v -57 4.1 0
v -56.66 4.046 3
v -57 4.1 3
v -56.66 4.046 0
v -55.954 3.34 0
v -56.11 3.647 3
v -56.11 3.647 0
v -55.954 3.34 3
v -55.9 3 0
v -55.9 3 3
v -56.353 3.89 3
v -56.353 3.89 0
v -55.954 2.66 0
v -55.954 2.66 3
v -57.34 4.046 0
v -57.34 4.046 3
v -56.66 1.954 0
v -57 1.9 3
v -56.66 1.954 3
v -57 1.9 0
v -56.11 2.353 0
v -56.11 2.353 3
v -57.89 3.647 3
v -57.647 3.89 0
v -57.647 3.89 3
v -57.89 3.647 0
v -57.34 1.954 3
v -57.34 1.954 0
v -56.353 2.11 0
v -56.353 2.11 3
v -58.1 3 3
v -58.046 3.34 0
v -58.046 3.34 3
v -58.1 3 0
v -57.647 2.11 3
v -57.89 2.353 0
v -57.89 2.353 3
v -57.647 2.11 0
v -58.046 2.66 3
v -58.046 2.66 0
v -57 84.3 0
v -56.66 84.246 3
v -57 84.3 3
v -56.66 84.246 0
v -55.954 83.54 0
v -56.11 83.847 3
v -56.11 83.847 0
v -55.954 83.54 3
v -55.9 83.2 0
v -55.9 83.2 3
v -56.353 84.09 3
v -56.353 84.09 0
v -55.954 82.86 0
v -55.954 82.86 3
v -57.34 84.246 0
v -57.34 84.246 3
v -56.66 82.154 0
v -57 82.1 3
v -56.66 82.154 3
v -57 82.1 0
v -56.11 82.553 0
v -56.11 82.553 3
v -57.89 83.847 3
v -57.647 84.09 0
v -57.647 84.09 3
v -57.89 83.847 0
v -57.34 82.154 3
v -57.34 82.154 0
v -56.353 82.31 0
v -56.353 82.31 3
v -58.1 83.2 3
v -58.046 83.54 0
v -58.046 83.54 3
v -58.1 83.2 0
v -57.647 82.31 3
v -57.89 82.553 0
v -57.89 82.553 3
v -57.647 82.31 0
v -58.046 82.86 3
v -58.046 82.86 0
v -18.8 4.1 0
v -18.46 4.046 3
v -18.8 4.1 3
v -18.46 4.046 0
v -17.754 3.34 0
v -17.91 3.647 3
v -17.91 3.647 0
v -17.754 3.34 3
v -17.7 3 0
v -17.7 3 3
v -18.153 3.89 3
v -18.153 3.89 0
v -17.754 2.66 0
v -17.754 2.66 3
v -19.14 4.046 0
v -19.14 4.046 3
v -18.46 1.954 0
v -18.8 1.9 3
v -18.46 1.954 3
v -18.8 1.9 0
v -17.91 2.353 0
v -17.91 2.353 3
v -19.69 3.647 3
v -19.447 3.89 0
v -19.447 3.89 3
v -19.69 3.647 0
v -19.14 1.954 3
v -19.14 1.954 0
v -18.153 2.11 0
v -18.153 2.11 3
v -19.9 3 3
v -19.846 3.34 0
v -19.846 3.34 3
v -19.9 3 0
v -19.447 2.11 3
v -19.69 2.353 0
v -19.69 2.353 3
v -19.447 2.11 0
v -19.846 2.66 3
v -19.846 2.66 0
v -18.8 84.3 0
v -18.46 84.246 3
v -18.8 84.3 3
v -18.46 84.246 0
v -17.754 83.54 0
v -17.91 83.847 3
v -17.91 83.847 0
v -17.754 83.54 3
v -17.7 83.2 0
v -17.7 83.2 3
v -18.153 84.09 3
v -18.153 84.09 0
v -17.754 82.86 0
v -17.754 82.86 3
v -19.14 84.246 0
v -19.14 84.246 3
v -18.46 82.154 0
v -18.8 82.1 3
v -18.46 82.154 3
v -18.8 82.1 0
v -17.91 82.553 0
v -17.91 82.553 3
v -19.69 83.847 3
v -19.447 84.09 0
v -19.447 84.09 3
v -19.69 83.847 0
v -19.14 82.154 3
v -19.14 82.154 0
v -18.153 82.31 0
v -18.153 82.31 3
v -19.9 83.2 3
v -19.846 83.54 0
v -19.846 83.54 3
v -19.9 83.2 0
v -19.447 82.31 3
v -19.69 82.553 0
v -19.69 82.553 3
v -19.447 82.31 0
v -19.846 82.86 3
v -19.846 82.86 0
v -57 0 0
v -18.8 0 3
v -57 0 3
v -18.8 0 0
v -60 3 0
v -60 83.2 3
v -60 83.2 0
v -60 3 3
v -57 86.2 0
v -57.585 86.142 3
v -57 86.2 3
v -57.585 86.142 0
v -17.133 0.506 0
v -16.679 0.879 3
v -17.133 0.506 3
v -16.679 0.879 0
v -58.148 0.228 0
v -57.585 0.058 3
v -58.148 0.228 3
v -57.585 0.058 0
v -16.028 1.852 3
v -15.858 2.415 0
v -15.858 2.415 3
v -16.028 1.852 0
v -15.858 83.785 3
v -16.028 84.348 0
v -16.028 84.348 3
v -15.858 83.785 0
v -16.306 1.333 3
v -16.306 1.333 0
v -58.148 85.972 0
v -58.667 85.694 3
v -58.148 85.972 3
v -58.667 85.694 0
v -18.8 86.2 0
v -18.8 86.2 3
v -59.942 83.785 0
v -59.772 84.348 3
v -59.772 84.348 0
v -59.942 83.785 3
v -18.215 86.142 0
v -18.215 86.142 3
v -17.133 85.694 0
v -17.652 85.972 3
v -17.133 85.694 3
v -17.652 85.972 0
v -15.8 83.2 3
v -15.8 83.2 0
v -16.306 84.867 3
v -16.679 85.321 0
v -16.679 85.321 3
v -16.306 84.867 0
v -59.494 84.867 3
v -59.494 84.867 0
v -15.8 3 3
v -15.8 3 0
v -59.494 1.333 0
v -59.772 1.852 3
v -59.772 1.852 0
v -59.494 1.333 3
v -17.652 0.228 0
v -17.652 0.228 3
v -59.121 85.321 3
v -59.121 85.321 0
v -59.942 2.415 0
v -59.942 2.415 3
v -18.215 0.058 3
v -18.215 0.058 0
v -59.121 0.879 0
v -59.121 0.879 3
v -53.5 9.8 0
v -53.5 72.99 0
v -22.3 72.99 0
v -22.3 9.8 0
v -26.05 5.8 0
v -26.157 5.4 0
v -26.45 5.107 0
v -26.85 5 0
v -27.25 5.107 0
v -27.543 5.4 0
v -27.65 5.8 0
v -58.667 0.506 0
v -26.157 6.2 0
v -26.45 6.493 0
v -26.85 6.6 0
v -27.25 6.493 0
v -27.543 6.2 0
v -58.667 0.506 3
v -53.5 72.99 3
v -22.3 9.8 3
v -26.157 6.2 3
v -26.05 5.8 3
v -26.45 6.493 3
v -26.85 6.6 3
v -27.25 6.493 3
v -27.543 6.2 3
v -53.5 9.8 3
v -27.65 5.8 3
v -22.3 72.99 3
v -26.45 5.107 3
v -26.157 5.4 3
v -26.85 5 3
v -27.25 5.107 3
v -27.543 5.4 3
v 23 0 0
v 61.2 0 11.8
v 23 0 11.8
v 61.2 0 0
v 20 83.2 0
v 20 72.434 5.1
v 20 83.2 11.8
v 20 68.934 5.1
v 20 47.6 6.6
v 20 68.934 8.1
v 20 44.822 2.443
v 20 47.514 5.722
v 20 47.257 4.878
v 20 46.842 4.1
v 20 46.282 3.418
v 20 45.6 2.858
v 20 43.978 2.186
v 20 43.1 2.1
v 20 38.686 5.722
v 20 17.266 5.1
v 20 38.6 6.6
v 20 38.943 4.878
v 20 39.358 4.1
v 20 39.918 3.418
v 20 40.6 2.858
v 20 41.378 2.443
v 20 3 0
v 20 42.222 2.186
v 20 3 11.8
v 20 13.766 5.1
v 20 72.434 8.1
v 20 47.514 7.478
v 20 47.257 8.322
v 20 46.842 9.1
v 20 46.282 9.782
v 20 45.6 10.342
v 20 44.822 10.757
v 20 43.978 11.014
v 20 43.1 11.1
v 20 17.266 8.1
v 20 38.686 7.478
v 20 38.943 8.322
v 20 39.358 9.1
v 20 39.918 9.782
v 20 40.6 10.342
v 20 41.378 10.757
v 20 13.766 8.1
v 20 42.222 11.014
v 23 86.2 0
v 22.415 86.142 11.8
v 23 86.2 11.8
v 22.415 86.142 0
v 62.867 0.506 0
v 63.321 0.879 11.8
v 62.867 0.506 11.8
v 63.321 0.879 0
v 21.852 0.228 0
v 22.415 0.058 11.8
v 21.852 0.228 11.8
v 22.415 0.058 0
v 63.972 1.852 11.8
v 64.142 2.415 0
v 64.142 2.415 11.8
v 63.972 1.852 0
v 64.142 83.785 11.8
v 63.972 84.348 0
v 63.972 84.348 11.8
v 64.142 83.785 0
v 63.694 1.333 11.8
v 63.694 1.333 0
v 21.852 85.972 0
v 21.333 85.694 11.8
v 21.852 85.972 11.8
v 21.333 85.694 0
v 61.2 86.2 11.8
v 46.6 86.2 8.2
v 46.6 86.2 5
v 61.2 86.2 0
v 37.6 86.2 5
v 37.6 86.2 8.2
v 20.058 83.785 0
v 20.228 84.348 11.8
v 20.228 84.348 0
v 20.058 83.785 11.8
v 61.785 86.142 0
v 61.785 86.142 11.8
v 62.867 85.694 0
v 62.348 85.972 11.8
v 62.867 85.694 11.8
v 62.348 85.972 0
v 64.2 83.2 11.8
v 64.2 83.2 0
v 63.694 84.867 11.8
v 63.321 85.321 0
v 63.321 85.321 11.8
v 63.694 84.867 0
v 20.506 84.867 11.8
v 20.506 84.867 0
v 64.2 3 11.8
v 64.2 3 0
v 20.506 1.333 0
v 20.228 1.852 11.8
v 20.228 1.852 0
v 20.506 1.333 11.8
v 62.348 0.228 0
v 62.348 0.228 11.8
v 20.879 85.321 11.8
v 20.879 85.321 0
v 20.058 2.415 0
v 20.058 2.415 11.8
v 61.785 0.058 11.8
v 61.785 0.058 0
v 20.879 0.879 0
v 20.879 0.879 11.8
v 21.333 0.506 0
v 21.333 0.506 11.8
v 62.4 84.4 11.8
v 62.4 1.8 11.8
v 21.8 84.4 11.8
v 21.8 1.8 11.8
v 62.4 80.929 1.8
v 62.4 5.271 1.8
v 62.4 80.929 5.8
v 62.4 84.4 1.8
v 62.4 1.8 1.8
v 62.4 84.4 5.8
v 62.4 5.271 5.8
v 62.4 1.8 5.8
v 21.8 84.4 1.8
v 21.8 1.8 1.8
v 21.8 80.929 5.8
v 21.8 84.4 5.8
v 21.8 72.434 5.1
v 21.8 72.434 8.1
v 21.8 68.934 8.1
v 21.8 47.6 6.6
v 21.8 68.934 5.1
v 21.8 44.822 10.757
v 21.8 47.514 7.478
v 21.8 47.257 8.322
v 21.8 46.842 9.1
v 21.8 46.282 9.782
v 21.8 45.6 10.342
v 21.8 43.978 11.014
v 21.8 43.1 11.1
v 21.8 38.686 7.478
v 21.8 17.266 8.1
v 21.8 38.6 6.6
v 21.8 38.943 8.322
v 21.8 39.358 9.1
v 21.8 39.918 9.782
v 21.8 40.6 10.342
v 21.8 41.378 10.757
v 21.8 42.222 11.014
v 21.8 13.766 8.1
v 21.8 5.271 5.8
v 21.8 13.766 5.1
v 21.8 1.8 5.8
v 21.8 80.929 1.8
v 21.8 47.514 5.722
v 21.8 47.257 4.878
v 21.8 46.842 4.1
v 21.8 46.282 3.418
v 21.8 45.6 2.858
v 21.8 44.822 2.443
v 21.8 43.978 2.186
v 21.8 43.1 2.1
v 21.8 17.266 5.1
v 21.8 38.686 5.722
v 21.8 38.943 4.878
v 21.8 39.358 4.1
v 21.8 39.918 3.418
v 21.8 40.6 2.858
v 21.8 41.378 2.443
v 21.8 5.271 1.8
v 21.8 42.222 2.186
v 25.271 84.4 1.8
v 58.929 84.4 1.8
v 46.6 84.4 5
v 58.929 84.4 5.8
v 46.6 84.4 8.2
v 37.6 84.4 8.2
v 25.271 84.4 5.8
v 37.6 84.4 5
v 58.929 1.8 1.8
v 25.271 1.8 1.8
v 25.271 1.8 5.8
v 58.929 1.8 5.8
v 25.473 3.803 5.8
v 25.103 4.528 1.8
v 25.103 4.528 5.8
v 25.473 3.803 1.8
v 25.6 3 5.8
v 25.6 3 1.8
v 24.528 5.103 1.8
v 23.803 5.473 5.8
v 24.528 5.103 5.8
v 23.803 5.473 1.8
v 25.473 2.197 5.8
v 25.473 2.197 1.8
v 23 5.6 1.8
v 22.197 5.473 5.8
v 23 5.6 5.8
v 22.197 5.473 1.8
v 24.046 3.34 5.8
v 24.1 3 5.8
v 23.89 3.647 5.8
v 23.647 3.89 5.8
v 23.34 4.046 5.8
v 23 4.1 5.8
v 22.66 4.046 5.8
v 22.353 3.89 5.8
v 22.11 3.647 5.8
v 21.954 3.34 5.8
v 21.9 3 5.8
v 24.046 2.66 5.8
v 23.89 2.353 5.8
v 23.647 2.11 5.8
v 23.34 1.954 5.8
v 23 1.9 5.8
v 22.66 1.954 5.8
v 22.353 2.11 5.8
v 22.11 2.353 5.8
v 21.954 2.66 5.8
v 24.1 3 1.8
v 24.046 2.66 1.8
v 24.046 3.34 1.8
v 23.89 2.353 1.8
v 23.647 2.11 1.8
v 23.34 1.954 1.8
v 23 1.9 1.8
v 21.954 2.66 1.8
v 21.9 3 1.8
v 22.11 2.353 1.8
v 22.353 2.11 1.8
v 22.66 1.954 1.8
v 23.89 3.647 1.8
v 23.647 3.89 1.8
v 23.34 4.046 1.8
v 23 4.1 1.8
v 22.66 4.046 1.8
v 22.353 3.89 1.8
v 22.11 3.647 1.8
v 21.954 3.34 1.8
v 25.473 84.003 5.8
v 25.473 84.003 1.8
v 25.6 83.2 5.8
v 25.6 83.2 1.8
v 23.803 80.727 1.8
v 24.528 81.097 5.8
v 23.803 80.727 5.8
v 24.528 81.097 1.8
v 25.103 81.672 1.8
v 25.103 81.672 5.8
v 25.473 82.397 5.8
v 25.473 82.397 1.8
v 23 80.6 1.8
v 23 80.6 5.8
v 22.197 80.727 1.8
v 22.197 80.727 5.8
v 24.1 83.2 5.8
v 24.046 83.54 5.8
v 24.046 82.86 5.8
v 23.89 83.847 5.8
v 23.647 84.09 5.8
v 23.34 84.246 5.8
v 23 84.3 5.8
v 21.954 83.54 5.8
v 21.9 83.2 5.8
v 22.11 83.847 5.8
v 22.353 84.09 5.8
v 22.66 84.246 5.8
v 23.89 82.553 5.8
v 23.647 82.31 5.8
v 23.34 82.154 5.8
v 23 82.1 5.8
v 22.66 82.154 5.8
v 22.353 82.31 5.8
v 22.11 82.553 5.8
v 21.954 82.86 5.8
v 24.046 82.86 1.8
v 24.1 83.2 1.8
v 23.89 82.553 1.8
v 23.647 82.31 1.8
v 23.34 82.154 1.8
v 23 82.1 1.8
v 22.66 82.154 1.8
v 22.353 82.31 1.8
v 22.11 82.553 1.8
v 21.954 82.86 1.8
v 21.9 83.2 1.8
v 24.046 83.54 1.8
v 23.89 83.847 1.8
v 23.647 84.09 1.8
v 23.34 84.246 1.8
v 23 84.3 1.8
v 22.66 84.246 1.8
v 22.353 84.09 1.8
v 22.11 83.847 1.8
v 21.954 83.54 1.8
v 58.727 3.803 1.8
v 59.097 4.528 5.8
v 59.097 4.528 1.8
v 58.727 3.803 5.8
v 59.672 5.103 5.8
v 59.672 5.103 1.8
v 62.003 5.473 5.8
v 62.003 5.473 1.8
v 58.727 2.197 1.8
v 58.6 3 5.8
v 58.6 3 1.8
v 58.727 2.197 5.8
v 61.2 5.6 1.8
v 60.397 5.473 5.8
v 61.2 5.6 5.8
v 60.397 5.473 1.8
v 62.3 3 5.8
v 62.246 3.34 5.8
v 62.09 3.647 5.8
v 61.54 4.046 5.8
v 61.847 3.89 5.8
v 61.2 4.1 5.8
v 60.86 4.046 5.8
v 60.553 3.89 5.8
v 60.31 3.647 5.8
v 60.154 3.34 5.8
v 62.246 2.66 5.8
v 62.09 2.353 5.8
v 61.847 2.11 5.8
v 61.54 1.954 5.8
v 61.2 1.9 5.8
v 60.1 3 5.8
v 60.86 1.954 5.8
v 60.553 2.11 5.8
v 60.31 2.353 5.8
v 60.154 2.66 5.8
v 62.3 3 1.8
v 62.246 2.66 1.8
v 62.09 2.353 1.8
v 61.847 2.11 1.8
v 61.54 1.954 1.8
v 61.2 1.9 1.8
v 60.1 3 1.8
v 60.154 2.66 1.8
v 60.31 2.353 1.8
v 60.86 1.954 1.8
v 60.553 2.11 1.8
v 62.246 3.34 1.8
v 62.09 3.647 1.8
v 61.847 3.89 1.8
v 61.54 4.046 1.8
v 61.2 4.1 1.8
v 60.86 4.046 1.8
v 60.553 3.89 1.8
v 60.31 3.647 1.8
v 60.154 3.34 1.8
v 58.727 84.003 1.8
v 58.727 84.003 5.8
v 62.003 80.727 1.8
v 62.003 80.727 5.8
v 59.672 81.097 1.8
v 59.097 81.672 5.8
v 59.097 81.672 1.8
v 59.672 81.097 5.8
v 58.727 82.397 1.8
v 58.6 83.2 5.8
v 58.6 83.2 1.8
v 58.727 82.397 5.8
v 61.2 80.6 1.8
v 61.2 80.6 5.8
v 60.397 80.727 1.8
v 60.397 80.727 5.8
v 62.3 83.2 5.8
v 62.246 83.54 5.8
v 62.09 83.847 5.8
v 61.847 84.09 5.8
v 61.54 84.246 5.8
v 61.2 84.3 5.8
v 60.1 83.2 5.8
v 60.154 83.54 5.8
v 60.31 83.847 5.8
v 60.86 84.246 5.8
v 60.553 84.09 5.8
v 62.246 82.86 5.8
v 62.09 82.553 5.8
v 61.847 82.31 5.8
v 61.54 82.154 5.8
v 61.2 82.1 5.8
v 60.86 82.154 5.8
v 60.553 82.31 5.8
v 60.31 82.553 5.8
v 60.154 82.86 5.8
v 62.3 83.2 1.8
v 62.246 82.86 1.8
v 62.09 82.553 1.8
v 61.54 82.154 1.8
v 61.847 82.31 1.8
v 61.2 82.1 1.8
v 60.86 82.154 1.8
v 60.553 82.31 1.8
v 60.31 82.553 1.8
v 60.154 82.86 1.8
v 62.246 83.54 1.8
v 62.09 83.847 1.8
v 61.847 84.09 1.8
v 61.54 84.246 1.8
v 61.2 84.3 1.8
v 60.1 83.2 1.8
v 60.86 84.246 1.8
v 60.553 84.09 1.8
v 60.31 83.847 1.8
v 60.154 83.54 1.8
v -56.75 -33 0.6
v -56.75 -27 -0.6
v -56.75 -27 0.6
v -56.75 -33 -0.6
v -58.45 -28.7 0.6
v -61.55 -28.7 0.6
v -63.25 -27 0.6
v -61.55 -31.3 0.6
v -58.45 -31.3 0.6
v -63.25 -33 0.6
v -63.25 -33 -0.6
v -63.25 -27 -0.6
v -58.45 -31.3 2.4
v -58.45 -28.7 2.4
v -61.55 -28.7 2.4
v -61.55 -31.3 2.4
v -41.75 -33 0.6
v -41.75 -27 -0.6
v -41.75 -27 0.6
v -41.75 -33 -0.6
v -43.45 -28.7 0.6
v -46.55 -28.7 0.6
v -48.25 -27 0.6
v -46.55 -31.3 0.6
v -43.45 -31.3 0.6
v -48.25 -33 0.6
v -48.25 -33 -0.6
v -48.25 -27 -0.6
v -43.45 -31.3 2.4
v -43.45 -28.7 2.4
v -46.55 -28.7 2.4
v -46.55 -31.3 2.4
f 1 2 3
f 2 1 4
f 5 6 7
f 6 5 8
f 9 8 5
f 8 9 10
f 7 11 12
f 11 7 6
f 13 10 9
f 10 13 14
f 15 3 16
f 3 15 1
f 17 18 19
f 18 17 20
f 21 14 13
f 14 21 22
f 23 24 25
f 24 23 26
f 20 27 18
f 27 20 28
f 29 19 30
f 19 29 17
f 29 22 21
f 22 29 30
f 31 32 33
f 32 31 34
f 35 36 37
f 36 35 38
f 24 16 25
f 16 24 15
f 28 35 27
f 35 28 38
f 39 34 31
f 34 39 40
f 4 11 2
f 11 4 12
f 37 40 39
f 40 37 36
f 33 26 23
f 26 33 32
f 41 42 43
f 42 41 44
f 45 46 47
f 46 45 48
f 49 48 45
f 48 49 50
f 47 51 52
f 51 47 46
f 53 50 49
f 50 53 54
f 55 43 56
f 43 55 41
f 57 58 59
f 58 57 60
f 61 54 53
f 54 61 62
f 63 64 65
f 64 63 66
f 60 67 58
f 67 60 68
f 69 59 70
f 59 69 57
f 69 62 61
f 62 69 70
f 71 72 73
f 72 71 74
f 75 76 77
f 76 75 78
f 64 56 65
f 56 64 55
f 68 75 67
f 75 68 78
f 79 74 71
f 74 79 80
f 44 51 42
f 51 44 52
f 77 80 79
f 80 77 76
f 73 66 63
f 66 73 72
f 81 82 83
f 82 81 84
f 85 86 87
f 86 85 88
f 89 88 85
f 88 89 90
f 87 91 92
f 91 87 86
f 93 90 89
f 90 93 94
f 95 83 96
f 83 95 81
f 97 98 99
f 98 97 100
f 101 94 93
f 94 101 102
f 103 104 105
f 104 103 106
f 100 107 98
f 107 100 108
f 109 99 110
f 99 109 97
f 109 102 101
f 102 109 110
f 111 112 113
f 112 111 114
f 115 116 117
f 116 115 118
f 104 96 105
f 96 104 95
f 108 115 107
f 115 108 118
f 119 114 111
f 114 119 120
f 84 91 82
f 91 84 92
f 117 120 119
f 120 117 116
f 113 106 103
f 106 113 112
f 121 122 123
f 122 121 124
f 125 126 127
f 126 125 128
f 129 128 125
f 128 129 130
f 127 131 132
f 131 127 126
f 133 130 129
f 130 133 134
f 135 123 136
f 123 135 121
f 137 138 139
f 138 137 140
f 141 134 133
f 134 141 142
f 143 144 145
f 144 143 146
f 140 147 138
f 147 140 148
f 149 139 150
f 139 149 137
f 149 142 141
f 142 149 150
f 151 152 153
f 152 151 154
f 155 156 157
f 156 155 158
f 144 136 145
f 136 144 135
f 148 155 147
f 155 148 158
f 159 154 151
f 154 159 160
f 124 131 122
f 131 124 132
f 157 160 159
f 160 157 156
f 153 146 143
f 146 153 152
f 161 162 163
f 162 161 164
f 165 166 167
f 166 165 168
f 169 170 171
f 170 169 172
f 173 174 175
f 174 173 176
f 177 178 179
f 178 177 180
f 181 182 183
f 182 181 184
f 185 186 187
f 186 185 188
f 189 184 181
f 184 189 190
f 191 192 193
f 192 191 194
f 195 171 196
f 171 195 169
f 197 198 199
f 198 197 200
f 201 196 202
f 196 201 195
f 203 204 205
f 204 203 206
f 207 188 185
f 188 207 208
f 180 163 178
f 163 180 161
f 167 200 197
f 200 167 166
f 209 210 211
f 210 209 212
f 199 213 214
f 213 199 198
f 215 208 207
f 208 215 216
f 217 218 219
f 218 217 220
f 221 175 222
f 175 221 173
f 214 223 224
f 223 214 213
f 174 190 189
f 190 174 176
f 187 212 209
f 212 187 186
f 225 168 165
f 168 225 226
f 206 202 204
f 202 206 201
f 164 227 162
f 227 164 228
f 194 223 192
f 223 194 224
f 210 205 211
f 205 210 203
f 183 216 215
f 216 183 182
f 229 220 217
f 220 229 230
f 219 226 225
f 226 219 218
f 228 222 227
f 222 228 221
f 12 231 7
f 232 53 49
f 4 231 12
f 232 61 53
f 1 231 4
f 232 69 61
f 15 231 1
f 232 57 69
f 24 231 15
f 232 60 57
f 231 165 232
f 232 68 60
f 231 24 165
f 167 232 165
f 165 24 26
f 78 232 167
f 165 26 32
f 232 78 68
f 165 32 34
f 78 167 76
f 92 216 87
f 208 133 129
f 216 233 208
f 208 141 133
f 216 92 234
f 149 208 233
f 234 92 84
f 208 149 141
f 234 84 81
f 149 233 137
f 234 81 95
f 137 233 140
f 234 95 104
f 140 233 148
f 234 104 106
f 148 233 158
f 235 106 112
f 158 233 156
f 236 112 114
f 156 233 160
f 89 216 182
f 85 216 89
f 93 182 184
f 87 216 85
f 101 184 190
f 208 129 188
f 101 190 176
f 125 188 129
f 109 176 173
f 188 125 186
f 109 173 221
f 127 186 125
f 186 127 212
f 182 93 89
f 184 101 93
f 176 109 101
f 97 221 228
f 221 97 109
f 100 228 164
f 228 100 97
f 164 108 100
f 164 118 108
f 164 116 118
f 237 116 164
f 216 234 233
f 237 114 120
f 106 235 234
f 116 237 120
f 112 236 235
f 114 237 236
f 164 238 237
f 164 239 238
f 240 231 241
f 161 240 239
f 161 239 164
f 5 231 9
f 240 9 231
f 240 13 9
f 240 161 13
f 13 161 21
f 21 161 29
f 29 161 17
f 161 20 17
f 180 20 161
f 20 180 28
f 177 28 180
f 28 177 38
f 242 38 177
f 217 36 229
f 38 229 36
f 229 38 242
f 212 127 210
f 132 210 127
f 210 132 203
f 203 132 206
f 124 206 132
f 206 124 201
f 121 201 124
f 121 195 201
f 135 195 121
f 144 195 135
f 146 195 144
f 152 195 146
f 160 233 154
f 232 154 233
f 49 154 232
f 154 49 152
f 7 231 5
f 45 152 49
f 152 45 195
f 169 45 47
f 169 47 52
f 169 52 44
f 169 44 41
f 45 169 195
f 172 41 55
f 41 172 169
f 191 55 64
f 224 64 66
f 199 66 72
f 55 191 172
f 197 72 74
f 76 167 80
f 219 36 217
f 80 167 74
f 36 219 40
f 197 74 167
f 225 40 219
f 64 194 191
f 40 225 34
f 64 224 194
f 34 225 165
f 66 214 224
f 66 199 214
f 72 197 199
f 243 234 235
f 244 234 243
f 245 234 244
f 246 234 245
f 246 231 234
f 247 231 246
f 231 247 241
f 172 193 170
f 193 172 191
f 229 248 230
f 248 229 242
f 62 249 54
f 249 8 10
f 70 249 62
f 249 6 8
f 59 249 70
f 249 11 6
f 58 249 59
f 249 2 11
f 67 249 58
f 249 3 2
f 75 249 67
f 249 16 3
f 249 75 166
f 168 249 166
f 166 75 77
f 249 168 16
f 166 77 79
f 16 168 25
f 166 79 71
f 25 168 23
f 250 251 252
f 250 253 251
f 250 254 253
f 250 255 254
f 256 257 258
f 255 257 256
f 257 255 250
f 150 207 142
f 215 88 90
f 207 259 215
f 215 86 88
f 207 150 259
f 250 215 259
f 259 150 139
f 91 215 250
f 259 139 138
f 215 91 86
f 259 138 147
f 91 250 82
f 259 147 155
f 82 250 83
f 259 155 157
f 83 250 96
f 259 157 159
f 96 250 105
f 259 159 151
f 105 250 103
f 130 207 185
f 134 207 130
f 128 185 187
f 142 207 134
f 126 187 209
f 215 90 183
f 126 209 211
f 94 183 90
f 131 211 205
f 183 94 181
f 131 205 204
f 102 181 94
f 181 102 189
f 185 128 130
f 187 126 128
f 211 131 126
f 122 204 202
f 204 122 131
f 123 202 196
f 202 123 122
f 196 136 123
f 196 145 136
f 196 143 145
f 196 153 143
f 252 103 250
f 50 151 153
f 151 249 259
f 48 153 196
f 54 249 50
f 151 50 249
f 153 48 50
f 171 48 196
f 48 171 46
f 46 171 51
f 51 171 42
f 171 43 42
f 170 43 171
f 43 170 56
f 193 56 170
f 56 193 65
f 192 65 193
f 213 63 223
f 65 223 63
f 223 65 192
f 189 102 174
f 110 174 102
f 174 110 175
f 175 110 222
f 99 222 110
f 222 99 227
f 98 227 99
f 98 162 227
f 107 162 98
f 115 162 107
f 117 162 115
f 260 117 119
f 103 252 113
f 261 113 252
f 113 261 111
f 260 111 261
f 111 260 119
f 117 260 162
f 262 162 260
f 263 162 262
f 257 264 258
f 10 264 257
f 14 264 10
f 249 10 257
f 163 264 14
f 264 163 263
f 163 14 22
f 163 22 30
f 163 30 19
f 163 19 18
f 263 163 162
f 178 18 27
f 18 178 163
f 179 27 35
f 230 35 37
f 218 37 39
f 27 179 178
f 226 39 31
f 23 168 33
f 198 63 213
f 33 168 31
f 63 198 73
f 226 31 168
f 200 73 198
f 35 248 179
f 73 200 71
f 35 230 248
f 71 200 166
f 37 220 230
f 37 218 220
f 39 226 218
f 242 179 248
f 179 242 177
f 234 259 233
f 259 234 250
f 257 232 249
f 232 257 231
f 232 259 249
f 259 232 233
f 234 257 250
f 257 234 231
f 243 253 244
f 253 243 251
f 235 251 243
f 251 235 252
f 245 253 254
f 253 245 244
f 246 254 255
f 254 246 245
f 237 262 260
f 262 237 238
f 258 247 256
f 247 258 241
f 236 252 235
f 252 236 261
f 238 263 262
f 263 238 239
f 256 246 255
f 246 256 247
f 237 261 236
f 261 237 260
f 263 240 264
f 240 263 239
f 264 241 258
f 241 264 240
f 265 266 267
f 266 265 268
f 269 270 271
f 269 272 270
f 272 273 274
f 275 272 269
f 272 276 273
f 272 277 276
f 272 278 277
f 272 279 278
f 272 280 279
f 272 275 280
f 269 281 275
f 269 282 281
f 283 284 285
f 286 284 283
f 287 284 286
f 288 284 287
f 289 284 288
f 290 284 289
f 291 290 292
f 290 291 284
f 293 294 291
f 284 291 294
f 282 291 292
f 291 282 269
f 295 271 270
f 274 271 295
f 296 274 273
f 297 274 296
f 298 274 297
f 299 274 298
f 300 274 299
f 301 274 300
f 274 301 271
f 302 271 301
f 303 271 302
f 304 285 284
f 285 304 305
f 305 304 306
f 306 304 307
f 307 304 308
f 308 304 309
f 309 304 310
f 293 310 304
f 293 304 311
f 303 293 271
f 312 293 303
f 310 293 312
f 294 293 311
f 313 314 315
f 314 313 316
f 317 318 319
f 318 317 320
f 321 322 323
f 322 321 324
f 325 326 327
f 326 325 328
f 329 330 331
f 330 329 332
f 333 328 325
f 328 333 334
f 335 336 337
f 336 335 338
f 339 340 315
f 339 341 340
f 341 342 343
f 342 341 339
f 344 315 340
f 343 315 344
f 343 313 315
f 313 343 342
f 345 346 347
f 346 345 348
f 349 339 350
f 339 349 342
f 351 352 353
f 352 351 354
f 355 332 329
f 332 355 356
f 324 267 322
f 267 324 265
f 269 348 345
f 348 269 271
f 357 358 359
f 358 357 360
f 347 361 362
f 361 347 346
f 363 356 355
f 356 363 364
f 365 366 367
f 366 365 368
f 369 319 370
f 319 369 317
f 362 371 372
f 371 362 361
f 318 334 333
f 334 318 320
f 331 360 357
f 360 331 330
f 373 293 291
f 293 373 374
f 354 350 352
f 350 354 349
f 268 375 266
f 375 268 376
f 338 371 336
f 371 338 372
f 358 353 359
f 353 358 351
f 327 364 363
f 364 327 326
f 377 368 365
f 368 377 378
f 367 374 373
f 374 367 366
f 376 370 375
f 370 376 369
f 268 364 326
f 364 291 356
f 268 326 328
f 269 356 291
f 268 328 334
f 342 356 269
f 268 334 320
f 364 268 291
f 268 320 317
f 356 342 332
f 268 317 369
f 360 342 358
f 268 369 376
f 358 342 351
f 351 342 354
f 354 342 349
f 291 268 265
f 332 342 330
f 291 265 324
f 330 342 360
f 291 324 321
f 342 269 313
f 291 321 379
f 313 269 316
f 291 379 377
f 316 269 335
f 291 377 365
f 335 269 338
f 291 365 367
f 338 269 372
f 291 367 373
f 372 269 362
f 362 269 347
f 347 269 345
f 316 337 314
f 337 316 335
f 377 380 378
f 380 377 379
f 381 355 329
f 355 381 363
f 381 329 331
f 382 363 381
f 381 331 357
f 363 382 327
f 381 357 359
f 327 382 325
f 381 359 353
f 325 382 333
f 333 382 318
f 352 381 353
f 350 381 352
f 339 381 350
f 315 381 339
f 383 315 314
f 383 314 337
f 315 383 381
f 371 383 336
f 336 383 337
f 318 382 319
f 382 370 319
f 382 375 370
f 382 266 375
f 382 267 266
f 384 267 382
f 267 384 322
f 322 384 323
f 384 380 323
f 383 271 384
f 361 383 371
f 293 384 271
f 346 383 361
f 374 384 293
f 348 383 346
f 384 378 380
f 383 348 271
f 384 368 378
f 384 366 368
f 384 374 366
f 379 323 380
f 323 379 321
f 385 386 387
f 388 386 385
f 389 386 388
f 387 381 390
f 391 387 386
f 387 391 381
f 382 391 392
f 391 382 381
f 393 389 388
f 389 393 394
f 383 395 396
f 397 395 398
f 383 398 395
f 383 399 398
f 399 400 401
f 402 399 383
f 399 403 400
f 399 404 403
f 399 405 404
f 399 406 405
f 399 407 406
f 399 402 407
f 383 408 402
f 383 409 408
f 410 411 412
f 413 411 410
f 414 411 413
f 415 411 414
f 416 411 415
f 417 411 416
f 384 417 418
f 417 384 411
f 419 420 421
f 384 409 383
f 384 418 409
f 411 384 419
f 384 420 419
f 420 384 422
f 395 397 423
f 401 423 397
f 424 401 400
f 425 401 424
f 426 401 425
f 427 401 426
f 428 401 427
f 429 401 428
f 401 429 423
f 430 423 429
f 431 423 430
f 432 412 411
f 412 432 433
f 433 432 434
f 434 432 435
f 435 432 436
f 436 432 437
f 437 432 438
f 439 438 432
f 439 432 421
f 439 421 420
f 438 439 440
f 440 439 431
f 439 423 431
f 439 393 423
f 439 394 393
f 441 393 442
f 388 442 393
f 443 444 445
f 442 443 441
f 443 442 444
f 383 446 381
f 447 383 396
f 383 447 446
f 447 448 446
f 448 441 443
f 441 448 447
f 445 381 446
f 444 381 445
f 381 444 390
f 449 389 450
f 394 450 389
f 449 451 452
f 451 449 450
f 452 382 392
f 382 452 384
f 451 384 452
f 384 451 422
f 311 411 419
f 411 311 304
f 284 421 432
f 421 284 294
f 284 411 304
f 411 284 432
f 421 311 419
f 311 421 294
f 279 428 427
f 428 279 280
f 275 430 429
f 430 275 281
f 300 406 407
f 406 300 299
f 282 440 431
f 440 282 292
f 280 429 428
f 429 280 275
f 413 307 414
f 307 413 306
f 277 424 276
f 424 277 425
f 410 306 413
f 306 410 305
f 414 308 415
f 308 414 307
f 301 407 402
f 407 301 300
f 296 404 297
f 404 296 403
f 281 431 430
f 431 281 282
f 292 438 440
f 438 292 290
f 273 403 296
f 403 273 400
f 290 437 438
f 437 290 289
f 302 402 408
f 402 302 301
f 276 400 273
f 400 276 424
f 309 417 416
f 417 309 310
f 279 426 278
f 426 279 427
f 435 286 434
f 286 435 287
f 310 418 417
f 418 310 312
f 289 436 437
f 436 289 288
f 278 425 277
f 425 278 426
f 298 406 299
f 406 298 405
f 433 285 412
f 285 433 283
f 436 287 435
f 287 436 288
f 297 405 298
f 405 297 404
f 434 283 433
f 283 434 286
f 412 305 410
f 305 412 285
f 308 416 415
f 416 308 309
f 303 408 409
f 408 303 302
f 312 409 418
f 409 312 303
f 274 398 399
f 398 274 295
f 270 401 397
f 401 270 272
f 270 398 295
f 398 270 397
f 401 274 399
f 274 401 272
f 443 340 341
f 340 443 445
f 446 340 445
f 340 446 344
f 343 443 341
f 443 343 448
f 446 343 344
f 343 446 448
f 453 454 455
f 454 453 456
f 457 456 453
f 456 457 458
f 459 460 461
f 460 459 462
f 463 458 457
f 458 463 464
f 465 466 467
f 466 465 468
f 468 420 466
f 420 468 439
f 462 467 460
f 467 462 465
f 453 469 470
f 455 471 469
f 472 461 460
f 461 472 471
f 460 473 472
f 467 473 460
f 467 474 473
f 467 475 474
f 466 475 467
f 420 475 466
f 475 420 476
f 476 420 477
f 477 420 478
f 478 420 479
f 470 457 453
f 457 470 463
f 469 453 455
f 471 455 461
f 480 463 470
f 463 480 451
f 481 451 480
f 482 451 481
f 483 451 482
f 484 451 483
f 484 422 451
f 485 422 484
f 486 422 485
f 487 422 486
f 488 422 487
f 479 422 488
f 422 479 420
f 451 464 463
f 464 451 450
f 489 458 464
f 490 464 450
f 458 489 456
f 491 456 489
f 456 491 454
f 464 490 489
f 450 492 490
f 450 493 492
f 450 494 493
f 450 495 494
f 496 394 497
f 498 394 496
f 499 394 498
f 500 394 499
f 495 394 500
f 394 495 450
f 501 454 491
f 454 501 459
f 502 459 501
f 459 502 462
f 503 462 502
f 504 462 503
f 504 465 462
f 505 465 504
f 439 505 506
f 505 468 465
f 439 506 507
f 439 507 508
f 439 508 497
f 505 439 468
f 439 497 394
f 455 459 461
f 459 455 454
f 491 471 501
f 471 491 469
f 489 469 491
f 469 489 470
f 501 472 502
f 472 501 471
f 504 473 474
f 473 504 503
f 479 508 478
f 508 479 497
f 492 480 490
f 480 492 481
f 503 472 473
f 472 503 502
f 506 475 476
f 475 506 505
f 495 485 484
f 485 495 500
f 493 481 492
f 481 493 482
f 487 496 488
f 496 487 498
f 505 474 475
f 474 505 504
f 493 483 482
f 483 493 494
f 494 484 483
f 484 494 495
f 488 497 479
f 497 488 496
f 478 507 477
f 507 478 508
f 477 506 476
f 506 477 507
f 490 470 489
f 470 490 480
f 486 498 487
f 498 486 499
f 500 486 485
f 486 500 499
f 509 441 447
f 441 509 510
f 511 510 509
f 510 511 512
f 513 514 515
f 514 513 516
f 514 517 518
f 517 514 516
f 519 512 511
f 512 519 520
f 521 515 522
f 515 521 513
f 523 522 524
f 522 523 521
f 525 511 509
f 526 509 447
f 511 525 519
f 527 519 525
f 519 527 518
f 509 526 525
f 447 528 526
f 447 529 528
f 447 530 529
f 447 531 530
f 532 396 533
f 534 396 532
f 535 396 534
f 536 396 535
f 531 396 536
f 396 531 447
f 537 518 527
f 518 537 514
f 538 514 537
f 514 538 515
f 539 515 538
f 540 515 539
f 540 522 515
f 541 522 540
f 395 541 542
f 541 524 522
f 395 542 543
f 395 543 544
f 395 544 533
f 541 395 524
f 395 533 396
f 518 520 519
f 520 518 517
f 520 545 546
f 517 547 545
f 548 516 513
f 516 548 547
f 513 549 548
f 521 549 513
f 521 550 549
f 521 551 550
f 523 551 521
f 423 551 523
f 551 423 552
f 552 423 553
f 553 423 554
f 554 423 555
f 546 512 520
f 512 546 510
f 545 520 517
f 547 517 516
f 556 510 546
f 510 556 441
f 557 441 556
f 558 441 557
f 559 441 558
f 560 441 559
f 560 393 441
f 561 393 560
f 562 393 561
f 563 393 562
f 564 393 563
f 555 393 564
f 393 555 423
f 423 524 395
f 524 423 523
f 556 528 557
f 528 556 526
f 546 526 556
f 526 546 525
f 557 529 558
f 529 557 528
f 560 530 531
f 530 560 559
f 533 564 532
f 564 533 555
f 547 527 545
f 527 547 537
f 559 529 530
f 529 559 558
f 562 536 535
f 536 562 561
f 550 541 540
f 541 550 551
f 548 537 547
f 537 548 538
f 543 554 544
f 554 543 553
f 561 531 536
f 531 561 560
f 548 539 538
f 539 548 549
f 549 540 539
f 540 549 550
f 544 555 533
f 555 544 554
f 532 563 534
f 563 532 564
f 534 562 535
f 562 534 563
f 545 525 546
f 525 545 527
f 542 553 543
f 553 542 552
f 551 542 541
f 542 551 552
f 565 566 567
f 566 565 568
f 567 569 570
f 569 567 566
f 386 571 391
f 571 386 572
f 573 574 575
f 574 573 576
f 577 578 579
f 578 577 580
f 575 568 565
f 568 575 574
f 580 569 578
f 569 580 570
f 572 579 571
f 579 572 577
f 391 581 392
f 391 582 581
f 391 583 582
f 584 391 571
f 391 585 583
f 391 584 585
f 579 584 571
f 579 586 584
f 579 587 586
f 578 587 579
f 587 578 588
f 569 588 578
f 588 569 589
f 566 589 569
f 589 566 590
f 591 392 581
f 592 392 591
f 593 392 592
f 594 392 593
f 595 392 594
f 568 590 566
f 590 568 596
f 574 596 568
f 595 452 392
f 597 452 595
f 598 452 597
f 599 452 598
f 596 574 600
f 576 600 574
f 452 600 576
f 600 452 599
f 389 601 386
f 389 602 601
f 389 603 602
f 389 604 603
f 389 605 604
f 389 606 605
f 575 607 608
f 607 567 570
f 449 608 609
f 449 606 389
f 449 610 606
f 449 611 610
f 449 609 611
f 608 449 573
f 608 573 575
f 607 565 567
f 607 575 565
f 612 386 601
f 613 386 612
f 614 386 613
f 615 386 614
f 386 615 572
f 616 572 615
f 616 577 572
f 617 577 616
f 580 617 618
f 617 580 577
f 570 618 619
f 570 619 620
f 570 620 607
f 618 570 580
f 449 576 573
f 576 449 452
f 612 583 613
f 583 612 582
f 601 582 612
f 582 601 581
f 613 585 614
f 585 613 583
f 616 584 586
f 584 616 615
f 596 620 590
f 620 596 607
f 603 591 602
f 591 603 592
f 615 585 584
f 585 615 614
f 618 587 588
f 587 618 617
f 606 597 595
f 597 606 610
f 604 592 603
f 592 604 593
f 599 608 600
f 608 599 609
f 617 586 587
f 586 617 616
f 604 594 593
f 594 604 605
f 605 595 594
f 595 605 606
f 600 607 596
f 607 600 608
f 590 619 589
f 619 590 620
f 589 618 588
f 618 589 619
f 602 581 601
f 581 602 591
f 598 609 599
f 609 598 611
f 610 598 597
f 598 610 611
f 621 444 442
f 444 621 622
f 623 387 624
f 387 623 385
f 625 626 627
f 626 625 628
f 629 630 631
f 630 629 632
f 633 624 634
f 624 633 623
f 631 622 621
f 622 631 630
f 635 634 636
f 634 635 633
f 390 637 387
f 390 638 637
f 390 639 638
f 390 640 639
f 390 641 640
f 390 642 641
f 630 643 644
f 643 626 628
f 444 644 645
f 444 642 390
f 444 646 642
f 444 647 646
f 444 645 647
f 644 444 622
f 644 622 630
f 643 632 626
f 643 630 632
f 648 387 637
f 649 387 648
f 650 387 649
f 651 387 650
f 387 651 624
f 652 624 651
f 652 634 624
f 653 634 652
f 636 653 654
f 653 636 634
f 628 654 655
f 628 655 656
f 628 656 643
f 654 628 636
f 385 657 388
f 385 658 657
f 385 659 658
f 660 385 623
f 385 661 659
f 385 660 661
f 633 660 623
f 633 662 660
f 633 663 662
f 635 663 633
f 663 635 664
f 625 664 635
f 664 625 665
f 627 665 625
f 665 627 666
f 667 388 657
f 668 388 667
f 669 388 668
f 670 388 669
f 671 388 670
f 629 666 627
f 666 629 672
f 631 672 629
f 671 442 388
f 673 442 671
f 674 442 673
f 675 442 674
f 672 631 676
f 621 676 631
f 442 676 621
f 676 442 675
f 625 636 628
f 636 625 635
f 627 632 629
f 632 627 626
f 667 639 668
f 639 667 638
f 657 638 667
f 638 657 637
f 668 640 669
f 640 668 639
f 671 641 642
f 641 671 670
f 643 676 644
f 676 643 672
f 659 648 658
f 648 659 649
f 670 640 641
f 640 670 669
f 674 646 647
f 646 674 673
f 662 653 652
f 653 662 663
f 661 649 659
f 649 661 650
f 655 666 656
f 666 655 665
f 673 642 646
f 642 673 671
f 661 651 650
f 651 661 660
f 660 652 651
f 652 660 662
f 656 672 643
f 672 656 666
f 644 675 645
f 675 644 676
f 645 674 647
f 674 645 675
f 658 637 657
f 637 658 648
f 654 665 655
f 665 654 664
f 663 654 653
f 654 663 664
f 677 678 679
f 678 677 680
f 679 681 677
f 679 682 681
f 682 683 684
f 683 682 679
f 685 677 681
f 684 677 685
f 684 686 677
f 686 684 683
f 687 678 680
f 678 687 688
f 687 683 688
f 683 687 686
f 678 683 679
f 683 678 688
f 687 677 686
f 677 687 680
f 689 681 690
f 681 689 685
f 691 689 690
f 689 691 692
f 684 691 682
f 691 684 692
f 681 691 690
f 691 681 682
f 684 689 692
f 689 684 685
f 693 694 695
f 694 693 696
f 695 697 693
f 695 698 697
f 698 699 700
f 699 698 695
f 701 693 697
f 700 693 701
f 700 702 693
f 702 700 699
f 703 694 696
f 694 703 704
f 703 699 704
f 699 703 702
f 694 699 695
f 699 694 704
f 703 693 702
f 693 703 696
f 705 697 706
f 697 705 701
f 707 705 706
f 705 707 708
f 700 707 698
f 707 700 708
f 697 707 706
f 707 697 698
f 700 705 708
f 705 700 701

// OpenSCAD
// Parametric two-piece case for the CrowPanel ESP32 2.13" E-Paper board.
//
// Layout is derived from docs/images/hardware-overview.webp (annotated board photo).
// Board orientation used throughout this file: PCB_WIDTH = X (short axis), PCB_LENGTH =
// Y (long axis), Y=0 is the board's TOP short edge, Y=PCB_LENGTH is the BOTTOM short
// edge, X=0 is the LEFT long edge. Per the photo:
//   - LEFT edge (top to bottom): MENU button, Rotary Switch (encoder + knob), EXIT
//     button. All three are side-actuated (pressed/turned from the edge, not the face).
//   - TOP edge: GPIO_D (JST), BOOT button, RESET button. BOOT/RESET are ordinary
//     top-mounted tactiles (pressed straight down, from the display-facing side).
//   - BOTTOM edge: UART0 (JST), USB Type-C, BAT (JST).
//   - RIGHT edge: nothing.
//
// Two pieces:
//   front_frame() — a bezel over the display face. Owns the screen cutout and the
//     RESET pinhole, because both are accessed perpendicular to the board face.
//   back_shell()  — the piece with real wall height. Owns the LEFT-wall cutouts
//     (MENU/ROTARY/EXIT) and the BOTTOM-wall USB-C slot, because those are accessed
//     from the edge, in the plane of the wall, not through the face.
// button_extender() — a small printable plunger for MENU/EXIT (see the "Button
//   extenders" section below for why they're needed and how they're installed).
//
// TODO(verify) — ALL dimensions below are placeholders / educated guesses, not
// measurements. Elecrow publishes the real PCB outline as a .stp file in their GitHub
// repo (Elecrow-RD/CrowPanel-ESP32-2.13-E-paper-HMI-Display-with-122-250, "3D file"
// folder) — open it in FreeCAD, read the bounding box, mounting-hole positions, and the
// exact XYZ of MENU/ROTARY/EXIT/USB-C/RESET, and replace the values below before
// printing anything. Only the display's active-area size (31.2 x 63.19mm) and
// resolution came from Elecrow's published spec; the rest — including which edge each
// connector is on — comes from reading the annotated product photo, not a CAD source,
// so positions along each edge are still evenly-spaced guesses even though the edge
// assignment itself should now be correct.
//
// See enclosure/README.md.

// ---- Board (TODO: replace with real values from the .stp file) ----
PCB_WIDTH = 40;      // mm, guess
PCB_LENGTH = 82;     // mm, guess
PCB_THICKNESS = 1.6; // mm, standard
DISPLAY_ACTIVE_W = 31.2; // mm, from Elecrow spec (confirmed)
DISPLAY_ACTIVE_L = 63.19; // mm, from Elecrow spec (confirmed)
// Offset of the display's active area from the PCB's top edge / center — guess. This
// also doubles as the depth of the top margin band that holds GPIO_D/BOOT/RESET.
DISPLAY_OFFSET_Y = 8;

// Mounting holes — TODO: real positions from .stp. Placeholder: 4 corners, 3mm inset.
MOUNT_HOLE_D = 2.2; // for M2 self-tapping screws
MOUNT_INSET = 3;

// ---- Case shell ----
WALL = 1.8;
CLEARANCE = 0.3; // extra room around the PCB so it isn't a press-fit
STANDOFF_H = 4;   // height the PCB sits above the back floor, on screw posts
// Loose depth behind the PCB for the battery to sit in — NOT a dedicated pocket, just
// extra shell depth. A few mm is enough for a common thin LiPo pouch cell (e.g. a
// 502030-class cell is ~5mm thick); the battery is not press-fit or walled in, it just
// rests in whatever flat volume is left behind the standoffs. TODO: confirm against the
// actual cell once one is chosen — this is a depth budget, not a battery outline.
BATTERY_CAVITY_H = 6;

// Approximate Z height (measured from the back floor) of the PCB's edge-mounted
// components — i.e. where MENU/ROTARY/EXIT/USB-C actually sit once the board is resting
// on its standoffs. Guess: standoff height + half the PCB thickness (component height
// above/below the board surface itself is unknown). TODO(verify): replace once the real
// board + connector heights are known; this single number currently drives every
// left/bottom wall cutout's vertical placement.
EDGE_COMPONENT_Z = STANDOFF_H + PCB_THICKNESS / 2;

// ---- Left-edge cutouts: MENU, Rotary Switch, EXIT (top to bottom, per the photo) ----
// Small rectangular slots for the two side-actuated tactile buttons. TODO(verify): real
// spacing/size — these are evenly-spaced guesses along the left wall (fractions of the
// case's total outer length, defined once here so front_frame/back_shell agree).
CASE_LENGTH = PCB_LENGTH + 2 * CLEARANCE + 2 * WALL;
BUTTON_SLOT_W = 3.5; // along the wall (Y axis) — mm
BUTTON_SLOT_H = 3;   // vertical extent (Z axis) — mm
MENU_Y = CASE_LENGTH * 0.18;
ROTARY_Y = CASE_LENGTH * 0.50;
EXIT_Y = CASE_LENGTH * 0.82;

// Rotary encoder cutout needs real clearance for a knob that has to physically rotate —
// this is deliberately a plain round hole, not a button-sized via. TODO(verify): actual
// knob diameter; 9mm is a guess sized for a common small encoder knob with some spin
// clearance.
ROTARY_KNOB_D = 9;

// ---- Bottom-edge cutout: USB-C only ----
// USB-C gets a real slot because it's used routinely (charging + data). UART0 and BAT
// are deliberately left with NO exterior cutout:
//   - UART0 is a debug/flashing console, not a daily-use interface — treat it like
//     BOOT/GPIO_D on the top edge: open the case if you need it.
//   - BAT is a JST pigtail. The expected assembly order is: solder/plug the battery in,
//     tuck it into the flat cavity behind the PCB, THEN close the case — so the battery
//     connector never needs to be mated or unmated through a closed shell. If your build
//     needs battery hot-swap without opening the case, add a cutout here.
// TODO(verify): real USB-C position — currently centered on the bottom wall, which is
// only approximately right per the photo (UART0 left, USB-C center, BAT right).
USBC_W = 9;
USBC_H = 3.2;

// ---- Top-face cutout: RESET pinhole only ----
// BOOT and RESET are ordinary top-mounted tactiles pressed straight down through the
// front face, in the board's top margin band (between the PCB's top edge and the
// display's active area). BOOT and GPIO_D get no dedicated access — both are one-time
// flashing/debug interfaces, and opening the case is a reasonable ask for that.
// RESET gets a small paperclip-sized pinhole because a reader that hangs needs a reset
// without full disassembly. TODO(verify): real X/Y position of RESET within the top
// margin band; this is a guess placed away from the screen cutout and mount holes.
RESET_PIN_D = 1.6;

// ---- Button extenders (MENU / EXIT) ----
// The PCB sits inset from the case's outer wall surface by WALL + CLEARANCE (the wall
// thickness, plus the gap around the board). A side-mounted tactile switch's actual cap
// sits at the PCB edge, i.e. recessed behind the outer wall face by roughly that same
// amount — it will NOT reach flush with the case exterior on its own. These are small
// printable plunger pieces that bridge that gap.
//
// Shape: a flat cap/head (wide, thin — sits against the outer wall face and is what the
// fingertip presses) with a shaft rising from its center (slides through the wall slot
// and rests against the switch's actuator). Printed head-down on the bed, shaft pointing
// up — a squat "mushroom" cross-section, no overhangs beyond the head's edge, so it
// needs no supports.
//
// Assembly: friction-fit, inserted from OUTSIDE through the wall slot before the case is
// closed, head-first is impossible (head is wider than the slot on purpose) — insert
// shaft-first from the inside before mating front_frame/back_shell, so the head ends up
// resting against the outer wall face and the shaft points inward at the switch. The
// shaft is deliberately a shade shorter than WALL + CLEARANCE (see EXTENDER_SHAFT_LEN)
// so it doesn't pre-load the switch at rest; if it ends up too short to reach, add a
// drop of hot glue between the shaft tip and the switch cap rather than reprinting with
// a guessed longer shaft. No glue is needed to retain the piece itself — the head is
// wider than the slot on both faces of travel, so it can't fall out either way.
//
// The rotary encoder does NOT get an extender: encoder shafts/knobs typically already
// protrude further than a tactile button's cap, and the ROTARY_KNOB_D cutout above is
// sized to let the knob itself reach the case exterior directly.
EXTENDER_HEAD_W = BUTTON_SLOT_W + 3; // wider than the slot so it can't slip through
EXTENDER_HEAD_L = BUTTON_SLOT_H + 3;
EXTENDER_HEAD_T = 1.2;
EXTENDER_SHAFT_W = BUTTON_SLOT_W - 0.4; // sliding clearance inside the slot
EXTENDER_SHAFT_H = BUTTON_SLOT_H - 0.4;
EXTENDER_SHAFT_LEN = WALL + CLEARANCE - 0.3; // slightly short of the full gap — see above

module rounded_rect(w, l, r, h) {
  hull() {
    for (x = [r, w - r])
      for (y = [r, l - r])
        translate([x, y, 0]) cylinder(r = r, h = h, $fn = 32);
  }
}

module mount_holes(w, l, h) {
  // 4 corner screw posts — these are the ONLY circular holes that belong near the
  // case perimeter. They are structural (PCB mounting screws), not buttons.
  for (x = [MOUNT_INSET, w - MOUNT_INSET])
    for (y = [MOUNT_INSET, l - MOUNT_INSET])
      translate([x, y, -1]) cylinder(d = MOUNT_HOLE_D, h = h + 2, $fn = 20);
}

// Front frame: bezel over the display face. Only cutouts that are accessed
// perpendicular to the board face belong here — the screen, RESET, and the mount
// screws. MENU/EXIT/ROTARY/USB-C are on back_shell's walls instead (see below).
module front_frame() {
  w = PCB_WIDTH + 2 * CLEARANCE + 2 * WALL;
  l = PCB_LENGTH + 2 * CLEARANCE + 2 * WALL;
  h = 3;

  difference() {
    rounded_rect(w, l, 3, h);

    // screen cutout, centered over the display's active area
    translate([(w - DISPLAY_ACTIVE_W) / 2, DISPLAY_OFFSET_Y + WALL, -1])
      cube([DISPLAY_ACTIVE_W, DISPLAY_ACTIVE_L, h + 2]);

    // RESET pinhole, in the top margin band (between the PCB's top edge and the
    // display cutout) — see the "Top-face cutout" section above for why only RESET
    // gets one.
    translate([w * 0.75, WALL + DISPLAY_OFFSET_Y * 0.5, -1])
      cylinder(d = RESET_PIN_D, h = h + 2, $fn = 12);

    mount_holes(w, l, h);
  }
}

// Back shell: the piece with real wall height. Owns every edge-actuated cutout
// (MENU/ROTARY/EXIT on the left wall, USB-C on the bottom wall) because those switches
// are pressed/turned in the plane of the wall, not through the front face. Also owns
// the PCB standoffs and the flat, unwalled battery cavity behind them.
module back_shell() {
  w = PCB_WIDTH + 2 * CLEARANCE + 2 * WALL;
  l = PCB_LENGTH + 2 * CLEARANCE + 2 * WALL;
  wall_h = WALL + STANDOFF_H + BATTERY_CAVITY_H;
  z = WALL + EDGE_COMPONENT_Z; // absolute Z of edge components within the shell

  difference() {
    rounded_rect(w, l, 3, wall_h);

    // hollow out from the top down to a WALL-thick floor
    translate([WALL, WALL, WALL])
      cube([w - 2 * WALL, l - 2 * WALL, wall_h]);

    // LEFT wall — MENU (top), ROTARY (middle), EXIT (bottom), in that order.
    translate([-1, MENU_Y - BUTTON_SLOT_W / 2, z - BUTTON_SLOT_H / 2])
      cube([WALL + 2, BUTTON_SLOT_W, BUTTON_SLOT_H]);
    translate([-1, ROTARY_Y, z])
      rotate([0, 90, 0])
        cylinder(d = ROTARY_KNOB_D, h = WALL + 2, $fn = 32);
    translate([-1, EXIT_Y - BUTTON_SLOT_W / 2, z - BUTTON_SLOT_H / 2])
      cube([WALL + 2, BUTTON_SLOT_W, BUTTON_SLOT_H]);

    // BOTTOM wall — USB-C slot only (see "Bottom-edge cutout" section above).
    translate([(w - USBC_W) / 2, l - WALL - 1, z - USBC_H / 2])
      cube([USBC_W, WALL + 2, USBC_H]);
  }

  // PCB standoffs (screw posts) sitting inside the shell
  for (x = [MOUNT_INSET, w - MOUNT_INSET])
    for (y = [MOUNT_INSET, l - MOUNT_INSET])
      translate([x, y, WALL])
        difference() {
          cylinder(d = MOUNT_HOLE_D + 3, h = STANDOFF_H, $fn = 20);
          translate([0, 0, -1]) cylinder(d = MOUNT_HOLE_D, h = STANDOFF_H + 2, $fn = 20);
        }

  // No dedicated battery structure: BATTERY_CAVITY_H above is just shell depth left
  // flat and open behind the standoffs. The battery sits loose in it — see the
  // BATTERY_CAVITY_H comment for why there's no pocket/wall here.
}

// Small printable plunger for MENU/EXIT — see the "Button extenders" section above.
module button_extender() {
  union() {
    // head/cap — presses against the outer wall face
    translate([0, 0, 0])
      cube([EXTENDER_HEAD_W, EXTENDER_HEAD_L, EXTENDER_HEAD_T], center = true);
    // shaft — slides through the wall slot to the switch
    translate([0, 0, EXTENDER_HEAD_T / 2 + EXTENDER_SHAFT_LEN / 2])
      cube([EXTENDER_SHAFT_W, EXTENDER_SHAFT_H, EXTENDER_SHAFT_LEN], center = true);
  }
}

// Render both case pieces plus a pair of button extenders (MENU, EXIT) side by side for
// slicing. Comment out translates to inspect a single part.
translate([-60, 0, 0]) front_frame();
translate([20, 0, 0]) back_shell();
translate([-60, -30, 0]) button_extender();
translate([-45, -30, 0]) button_extender();
